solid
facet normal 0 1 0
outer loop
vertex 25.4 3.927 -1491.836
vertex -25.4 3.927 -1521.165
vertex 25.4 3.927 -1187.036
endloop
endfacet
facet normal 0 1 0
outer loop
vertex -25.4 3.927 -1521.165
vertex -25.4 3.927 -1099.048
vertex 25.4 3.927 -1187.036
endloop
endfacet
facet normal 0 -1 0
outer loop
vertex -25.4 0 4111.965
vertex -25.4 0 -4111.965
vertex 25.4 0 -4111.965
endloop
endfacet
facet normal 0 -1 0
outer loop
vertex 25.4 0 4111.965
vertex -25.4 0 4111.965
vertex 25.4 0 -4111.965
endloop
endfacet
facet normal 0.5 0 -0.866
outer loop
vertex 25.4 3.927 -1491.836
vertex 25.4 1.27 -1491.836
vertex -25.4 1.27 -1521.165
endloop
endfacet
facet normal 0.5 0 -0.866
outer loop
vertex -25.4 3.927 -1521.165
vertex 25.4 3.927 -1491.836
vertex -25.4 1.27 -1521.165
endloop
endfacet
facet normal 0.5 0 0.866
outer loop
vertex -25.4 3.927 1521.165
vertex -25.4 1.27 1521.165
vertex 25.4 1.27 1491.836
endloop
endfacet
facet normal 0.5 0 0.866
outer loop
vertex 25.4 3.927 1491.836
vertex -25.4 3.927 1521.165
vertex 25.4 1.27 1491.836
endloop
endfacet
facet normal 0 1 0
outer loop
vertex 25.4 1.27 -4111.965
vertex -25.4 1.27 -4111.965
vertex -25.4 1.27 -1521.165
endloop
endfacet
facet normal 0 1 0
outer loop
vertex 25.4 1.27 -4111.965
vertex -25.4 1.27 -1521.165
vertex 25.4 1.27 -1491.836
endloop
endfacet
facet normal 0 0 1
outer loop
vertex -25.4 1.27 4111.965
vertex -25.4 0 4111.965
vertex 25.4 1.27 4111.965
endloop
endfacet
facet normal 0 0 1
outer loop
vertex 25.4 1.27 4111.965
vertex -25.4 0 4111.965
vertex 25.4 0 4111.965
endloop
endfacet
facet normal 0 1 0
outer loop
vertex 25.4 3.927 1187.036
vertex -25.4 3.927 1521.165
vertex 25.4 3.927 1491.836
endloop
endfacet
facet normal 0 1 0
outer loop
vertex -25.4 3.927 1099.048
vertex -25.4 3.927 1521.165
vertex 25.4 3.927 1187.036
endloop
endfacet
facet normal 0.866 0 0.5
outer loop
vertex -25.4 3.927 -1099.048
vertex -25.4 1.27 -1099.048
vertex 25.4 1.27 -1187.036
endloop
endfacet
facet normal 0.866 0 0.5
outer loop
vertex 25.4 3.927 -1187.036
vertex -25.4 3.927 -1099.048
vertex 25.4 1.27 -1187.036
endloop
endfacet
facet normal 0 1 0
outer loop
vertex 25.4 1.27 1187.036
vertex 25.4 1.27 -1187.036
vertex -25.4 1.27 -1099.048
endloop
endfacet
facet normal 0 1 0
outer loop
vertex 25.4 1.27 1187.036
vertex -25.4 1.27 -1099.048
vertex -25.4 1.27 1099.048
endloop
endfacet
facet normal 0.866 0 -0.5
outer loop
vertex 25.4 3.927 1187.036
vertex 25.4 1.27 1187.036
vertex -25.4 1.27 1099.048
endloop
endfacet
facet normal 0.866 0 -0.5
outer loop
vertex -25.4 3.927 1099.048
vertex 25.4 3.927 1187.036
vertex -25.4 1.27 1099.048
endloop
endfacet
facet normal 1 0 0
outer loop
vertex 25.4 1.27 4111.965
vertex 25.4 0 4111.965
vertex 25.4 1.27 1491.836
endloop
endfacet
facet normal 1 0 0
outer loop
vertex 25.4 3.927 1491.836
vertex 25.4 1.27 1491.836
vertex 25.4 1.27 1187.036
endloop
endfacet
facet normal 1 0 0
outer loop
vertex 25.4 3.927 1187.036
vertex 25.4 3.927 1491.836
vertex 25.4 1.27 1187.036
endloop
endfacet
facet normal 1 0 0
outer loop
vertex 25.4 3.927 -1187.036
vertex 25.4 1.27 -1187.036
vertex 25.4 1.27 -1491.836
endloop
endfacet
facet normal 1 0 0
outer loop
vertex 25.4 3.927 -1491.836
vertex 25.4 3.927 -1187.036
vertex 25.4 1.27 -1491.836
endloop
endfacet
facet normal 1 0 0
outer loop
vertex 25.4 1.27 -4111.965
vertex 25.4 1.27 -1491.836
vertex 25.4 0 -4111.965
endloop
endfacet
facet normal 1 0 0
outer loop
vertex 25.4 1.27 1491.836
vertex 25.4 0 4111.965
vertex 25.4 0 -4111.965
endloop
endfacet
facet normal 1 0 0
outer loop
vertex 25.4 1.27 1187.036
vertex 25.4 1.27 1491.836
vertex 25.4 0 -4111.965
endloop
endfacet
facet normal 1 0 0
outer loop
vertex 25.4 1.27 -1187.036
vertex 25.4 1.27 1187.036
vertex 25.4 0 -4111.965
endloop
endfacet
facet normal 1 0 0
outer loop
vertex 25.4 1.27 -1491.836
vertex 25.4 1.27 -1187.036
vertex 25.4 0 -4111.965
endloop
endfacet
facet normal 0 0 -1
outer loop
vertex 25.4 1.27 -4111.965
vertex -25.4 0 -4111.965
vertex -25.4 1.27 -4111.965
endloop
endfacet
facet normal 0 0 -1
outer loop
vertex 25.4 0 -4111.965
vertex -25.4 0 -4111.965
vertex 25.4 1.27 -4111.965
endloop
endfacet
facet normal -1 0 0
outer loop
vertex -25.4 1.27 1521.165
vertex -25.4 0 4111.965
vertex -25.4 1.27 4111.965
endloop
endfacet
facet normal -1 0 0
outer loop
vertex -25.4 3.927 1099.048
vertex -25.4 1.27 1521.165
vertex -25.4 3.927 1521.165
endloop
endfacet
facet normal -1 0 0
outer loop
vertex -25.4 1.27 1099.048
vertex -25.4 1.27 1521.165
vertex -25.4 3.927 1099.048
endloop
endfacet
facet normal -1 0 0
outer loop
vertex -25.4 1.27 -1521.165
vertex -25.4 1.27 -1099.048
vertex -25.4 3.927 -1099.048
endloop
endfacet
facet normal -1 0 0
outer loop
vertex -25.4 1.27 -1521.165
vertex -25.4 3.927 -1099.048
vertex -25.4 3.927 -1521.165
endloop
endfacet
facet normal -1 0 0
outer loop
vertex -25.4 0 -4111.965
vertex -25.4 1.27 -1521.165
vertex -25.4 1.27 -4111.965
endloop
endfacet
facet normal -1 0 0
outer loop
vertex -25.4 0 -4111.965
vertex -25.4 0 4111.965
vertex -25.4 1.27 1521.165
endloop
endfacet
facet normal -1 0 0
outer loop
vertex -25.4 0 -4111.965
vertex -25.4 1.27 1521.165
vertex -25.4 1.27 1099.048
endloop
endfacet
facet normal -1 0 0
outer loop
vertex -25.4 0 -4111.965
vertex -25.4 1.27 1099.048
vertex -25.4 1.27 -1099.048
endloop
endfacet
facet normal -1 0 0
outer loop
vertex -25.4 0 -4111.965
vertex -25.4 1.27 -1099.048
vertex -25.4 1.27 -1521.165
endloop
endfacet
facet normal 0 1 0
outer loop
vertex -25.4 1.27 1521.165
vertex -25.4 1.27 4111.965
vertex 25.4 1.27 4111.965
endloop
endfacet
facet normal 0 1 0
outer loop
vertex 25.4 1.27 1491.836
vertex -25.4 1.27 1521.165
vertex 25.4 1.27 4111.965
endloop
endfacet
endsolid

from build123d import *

# Parameters (mm, degrees)
SKETCH1_W           = 50.8
SKETCH1_H           = 8223.93072
BOSS_EXTRUDE1_DEPTH = 1.27
BOSS_EXTRUDE2_DEPTH = 2.65684


with BuildPart() as part:
    # Sketch1 → Boss-Extrude1 (new body)
    with BuildSketch(Plane(origin=(0, 0, 0), x_dir=(1, 0, 0), z_dir=(0, 1, 0))):
        Rectangle(SKETCH1_W, SKETCH1_H)
    extrude(amount=BOSS_EXTRUDE1_DEPTH)

    # Sketch3 → Boss-Extrude2 (add)
    with BuildSketch(Plane(origin=(0, 1.27, 0), x_dir=(1, 0, 0), z_dir=(0, 1, 0))):
        Polygon((-25.4, -1099.047785301), (-25.4, -1521.16536), (25.4, -1491.835966325), (25.4, -1187.035966325), align=None)
        Polygon((-25.4, 1521.16536), (-25.4, 1099.047785301), (25.4, 1187.035966325), (25.4, 1491.835966325), align=None)
    extrude(amount=BOSS_EXTRUDE2_DEPTH)


solid = part.part
